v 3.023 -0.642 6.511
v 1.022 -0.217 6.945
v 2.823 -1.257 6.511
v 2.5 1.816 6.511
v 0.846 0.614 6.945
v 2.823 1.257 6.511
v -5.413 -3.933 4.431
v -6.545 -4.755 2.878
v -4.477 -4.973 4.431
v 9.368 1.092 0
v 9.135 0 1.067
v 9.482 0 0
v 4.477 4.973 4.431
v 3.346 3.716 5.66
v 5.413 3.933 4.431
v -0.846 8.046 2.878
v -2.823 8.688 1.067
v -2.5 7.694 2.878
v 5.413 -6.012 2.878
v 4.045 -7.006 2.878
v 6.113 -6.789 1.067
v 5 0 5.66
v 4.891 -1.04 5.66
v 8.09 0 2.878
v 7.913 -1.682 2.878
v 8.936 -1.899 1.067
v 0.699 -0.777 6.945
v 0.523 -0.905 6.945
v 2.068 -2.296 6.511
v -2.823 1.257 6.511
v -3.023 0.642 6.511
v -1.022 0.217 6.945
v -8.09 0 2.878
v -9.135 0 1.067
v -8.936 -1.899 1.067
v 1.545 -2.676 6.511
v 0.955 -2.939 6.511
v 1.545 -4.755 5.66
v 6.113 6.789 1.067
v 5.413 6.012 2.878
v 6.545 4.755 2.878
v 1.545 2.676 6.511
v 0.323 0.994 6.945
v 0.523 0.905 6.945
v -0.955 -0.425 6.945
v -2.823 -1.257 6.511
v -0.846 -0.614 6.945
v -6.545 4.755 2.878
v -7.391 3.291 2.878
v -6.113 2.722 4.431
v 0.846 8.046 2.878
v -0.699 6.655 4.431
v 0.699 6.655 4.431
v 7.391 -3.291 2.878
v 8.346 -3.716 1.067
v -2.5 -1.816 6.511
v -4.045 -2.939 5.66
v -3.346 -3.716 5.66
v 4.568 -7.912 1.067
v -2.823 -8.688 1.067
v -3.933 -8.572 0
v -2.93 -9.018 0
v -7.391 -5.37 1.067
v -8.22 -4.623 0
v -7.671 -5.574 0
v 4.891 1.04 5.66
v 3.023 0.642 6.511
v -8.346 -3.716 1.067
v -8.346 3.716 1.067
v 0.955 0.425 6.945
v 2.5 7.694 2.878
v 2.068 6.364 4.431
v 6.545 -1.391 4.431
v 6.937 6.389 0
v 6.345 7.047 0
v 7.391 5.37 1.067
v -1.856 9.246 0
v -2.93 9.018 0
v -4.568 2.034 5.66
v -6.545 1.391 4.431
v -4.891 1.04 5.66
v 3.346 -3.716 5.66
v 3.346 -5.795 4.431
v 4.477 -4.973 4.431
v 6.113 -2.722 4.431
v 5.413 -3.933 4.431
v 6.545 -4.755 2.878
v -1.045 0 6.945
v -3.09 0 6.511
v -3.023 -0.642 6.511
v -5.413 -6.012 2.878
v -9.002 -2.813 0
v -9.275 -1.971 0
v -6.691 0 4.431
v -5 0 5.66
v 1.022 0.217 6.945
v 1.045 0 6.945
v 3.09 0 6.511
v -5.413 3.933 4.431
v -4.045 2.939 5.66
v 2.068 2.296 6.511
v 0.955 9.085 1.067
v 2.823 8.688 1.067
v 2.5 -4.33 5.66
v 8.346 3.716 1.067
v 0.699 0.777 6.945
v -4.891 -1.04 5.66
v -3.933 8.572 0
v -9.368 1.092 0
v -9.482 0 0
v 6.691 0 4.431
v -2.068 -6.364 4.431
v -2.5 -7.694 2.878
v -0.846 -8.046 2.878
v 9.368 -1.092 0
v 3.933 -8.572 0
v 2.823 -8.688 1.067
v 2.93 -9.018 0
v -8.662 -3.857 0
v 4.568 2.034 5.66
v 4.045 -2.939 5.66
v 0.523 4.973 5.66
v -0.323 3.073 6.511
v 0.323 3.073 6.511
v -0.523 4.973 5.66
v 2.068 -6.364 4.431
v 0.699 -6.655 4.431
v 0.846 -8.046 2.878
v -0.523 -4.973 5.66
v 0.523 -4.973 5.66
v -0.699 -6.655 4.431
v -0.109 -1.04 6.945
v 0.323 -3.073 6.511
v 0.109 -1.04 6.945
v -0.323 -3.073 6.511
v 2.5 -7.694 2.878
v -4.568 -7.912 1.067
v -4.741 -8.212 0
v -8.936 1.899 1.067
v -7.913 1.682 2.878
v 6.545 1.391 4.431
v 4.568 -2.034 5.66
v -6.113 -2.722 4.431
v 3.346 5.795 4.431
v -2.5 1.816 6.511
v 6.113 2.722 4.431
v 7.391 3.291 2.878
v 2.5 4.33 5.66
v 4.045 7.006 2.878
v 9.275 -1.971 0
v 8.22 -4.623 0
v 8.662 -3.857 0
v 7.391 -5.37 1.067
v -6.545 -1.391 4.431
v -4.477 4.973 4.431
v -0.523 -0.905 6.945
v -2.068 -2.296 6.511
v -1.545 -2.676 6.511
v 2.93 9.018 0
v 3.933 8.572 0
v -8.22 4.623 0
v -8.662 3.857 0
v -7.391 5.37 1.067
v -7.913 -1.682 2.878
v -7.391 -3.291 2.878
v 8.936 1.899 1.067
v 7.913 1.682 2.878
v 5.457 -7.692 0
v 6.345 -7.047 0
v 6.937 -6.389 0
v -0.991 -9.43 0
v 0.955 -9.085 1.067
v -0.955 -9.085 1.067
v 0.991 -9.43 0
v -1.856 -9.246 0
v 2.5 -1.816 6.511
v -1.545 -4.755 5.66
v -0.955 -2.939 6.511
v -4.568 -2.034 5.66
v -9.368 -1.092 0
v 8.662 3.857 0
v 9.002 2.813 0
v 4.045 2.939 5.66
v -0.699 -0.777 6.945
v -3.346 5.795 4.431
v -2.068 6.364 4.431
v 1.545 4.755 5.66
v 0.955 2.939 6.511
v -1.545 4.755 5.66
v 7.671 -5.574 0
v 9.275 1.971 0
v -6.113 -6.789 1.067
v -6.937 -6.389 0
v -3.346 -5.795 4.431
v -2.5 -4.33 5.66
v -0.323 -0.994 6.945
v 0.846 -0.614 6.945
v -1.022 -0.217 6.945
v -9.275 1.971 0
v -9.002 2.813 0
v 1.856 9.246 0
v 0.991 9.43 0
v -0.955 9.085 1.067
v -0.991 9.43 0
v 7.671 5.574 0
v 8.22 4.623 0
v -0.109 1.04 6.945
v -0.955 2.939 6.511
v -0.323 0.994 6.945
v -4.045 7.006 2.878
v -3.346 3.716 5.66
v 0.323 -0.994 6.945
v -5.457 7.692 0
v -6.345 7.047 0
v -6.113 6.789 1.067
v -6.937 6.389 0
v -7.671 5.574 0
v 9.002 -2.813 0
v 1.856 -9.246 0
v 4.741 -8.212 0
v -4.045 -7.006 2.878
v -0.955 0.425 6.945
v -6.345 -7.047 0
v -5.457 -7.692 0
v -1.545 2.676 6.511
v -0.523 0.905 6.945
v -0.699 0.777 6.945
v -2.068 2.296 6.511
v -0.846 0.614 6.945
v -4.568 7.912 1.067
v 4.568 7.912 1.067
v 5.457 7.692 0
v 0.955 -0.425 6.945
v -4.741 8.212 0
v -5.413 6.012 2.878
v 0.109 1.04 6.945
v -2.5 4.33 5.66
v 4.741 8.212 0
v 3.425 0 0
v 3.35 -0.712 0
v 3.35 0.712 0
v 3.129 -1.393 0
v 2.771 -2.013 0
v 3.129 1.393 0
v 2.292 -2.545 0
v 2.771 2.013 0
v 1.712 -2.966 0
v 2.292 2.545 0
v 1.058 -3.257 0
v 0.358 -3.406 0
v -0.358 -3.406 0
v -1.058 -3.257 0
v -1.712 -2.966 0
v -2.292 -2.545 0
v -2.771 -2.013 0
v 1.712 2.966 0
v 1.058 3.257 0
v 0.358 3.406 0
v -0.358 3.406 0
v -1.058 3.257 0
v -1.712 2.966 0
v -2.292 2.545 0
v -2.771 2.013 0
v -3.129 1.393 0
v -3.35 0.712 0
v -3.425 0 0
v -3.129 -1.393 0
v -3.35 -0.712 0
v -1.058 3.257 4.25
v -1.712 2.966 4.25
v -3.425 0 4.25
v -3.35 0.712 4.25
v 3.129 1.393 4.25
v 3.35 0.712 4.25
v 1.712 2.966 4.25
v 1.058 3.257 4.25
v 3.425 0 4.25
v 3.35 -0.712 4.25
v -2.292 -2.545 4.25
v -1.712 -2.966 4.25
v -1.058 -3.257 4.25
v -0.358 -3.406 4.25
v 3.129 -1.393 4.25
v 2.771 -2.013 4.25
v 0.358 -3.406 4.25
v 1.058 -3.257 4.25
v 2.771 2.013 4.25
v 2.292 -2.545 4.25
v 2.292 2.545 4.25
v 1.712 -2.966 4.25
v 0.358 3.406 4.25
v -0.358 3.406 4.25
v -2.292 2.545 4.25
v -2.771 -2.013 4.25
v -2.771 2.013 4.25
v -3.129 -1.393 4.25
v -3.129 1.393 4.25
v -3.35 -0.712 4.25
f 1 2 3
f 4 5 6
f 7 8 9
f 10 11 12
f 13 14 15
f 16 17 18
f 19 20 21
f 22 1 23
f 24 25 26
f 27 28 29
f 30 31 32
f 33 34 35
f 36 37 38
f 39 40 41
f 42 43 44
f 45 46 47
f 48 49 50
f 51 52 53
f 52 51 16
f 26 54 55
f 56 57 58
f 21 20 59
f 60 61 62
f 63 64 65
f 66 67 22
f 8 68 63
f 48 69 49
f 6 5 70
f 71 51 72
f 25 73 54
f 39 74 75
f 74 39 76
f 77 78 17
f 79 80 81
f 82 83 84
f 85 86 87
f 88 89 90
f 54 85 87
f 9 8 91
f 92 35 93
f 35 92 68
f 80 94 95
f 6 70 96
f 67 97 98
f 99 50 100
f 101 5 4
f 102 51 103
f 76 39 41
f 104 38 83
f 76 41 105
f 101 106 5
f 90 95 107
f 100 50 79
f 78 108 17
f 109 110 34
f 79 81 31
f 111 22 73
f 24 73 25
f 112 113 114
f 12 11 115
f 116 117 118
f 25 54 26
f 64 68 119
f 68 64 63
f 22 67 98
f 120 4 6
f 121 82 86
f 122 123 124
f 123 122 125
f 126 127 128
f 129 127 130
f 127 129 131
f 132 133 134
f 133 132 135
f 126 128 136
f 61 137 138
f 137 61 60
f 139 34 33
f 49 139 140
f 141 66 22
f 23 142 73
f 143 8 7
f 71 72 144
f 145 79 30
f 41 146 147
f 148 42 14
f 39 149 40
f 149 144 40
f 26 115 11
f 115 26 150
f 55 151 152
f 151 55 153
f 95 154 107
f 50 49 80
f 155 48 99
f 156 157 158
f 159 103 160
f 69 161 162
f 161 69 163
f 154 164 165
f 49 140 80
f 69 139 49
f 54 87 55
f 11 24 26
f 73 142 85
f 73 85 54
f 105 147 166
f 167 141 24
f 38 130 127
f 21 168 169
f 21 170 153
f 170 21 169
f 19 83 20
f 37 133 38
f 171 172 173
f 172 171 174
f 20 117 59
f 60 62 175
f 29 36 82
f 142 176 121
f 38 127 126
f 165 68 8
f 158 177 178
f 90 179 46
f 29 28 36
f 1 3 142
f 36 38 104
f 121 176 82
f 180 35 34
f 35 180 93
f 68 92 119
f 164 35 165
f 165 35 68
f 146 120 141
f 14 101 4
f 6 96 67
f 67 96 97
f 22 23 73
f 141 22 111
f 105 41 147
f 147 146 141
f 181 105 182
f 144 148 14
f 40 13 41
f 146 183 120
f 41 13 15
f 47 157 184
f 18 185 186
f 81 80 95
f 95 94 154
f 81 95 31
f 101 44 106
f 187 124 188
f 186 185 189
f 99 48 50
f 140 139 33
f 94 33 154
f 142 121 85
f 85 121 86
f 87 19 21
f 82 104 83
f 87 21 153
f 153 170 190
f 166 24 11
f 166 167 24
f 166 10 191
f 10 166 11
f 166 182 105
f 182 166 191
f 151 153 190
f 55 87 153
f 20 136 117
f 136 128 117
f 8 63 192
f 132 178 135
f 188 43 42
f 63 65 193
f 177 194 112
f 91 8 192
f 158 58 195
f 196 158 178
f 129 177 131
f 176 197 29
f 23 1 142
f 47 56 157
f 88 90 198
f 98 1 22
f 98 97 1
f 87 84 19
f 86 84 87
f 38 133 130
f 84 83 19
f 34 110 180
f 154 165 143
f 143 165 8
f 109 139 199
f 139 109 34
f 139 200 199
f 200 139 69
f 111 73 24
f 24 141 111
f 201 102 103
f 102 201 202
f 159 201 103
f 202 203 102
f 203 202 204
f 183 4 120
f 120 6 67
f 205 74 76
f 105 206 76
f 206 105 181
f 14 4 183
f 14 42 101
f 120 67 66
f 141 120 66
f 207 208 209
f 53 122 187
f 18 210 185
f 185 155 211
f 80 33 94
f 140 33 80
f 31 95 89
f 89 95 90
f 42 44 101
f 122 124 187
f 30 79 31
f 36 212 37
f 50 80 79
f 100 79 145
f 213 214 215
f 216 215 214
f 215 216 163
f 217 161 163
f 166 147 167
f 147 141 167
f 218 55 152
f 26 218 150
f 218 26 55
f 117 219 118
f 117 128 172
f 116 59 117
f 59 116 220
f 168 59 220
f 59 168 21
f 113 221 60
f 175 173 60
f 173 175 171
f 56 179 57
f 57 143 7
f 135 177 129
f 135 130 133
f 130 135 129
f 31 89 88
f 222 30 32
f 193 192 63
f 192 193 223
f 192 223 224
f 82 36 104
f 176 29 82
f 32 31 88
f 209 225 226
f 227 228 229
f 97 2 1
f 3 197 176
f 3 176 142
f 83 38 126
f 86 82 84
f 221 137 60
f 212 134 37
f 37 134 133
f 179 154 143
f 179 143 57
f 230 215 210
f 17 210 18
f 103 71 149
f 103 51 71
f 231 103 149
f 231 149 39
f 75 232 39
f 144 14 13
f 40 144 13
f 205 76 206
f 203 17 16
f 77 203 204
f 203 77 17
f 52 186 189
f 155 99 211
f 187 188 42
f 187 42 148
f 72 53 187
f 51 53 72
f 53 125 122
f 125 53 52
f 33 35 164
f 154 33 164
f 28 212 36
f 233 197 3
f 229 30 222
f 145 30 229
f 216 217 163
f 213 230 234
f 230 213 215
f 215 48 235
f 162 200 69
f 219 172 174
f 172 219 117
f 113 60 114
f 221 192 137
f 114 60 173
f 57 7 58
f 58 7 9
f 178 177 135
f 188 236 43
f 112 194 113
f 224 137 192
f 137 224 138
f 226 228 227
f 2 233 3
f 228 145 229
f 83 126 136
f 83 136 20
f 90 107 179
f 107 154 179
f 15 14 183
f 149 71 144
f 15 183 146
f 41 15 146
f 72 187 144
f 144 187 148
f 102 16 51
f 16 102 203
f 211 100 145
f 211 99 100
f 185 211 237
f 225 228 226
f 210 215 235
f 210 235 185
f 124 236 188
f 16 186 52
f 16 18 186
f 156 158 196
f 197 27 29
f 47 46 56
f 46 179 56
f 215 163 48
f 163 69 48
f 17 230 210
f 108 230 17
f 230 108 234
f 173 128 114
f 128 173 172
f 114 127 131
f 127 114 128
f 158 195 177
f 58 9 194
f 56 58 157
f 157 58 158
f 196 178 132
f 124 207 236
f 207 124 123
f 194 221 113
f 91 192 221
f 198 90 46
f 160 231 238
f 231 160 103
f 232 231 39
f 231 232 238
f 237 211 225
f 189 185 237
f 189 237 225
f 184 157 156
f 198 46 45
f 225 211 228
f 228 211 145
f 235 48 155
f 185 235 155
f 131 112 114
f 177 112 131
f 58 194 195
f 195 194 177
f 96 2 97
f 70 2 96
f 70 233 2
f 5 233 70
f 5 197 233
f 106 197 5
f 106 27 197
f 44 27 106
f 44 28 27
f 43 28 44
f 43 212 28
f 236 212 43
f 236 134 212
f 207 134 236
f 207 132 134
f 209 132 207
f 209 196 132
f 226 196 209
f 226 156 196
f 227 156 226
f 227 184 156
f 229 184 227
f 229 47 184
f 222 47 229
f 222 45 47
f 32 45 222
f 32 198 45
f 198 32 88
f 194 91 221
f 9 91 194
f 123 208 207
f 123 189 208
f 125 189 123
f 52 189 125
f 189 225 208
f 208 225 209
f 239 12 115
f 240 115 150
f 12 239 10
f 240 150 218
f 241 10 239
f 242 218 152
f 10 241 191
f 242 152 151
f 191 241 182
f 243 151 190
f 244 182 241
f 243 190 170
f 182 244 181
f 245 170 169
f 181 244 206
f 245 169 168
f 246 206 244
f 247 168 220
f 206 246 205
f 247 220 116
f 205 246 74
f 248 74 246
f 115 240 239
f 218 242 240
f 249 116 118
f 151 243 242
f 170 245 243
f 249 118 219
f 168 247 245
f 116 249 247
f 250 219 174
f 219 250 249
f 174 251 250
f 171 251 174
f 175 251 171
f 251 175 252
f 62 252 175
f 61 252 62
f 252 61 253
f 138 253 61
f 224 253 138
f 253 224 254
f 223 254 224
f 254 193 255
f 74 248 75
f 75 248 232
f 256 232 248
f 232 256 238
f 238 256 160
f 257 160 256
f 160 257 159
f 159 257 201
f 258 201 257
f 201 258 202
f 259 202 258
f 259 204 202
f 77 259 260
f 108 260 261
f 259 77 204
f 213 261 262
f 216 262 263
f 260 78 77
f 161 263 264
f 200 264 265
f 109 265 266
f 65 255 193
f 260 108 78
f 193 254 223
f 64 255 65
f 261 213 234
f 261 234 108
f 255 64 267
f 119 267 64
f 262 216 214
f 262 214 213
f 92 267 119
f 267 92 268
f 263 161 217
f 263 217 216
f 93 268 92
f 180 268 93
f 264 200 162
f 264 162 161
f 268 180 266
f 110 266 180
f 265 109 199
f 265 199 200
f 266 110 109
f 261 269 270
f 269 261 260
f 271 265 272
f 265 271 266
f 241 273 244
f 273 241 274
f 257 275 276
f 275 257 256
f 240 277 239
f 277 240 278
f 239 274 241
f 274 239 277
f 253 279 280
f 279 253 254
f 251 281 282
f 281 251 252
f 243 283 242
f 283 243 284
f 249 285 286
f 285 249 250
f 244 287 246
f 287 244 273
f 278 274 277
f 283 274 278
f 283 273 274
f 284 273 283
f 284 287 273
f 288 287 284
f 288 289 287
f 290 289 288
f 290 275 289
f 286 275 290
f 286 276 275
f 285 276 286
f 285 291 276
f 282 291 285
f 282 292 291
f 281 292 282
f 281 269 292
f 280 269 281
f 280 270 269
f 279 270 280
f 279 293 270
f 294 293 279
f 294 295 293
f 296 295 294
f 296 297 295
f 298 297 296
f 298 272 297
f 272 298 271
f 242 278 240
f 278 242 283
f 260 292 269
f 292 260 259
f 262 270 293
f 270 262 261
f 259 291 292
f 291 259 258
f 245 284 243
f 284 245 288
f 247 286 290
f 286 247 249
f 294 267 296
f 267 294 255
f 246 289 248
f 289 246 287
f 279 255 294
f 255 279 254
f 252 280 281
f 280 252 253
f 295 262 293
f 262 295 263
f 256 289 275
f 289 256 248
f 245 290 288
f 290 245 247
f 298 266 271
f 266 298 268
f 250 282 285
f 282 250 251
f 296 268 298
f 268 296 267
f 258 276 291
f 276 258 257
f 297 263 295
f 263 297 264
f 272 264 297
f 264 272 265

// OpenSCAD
$fs=0.1;

// This needs a M4x12 screw with a hex socket top
module skadis_standoff() {
	difference() {
		cylinder(d1=14.5, d2=16.75, h=20);
		translate([0,0,10])
			cylinder(d=3.9, h=15);
	}
	//translate([0,0,20])
	//	cylinder(d=4.9, h=5);


	translate([0,-5,20])
		cylinder(d=2, h=2.5);
	translate([0,5,20])
		cylinder(d=2, h=2.5);
}

module skadis_topper() {
	difference() {
		translate([0,0,-3]) sphere(d=20);
		translate([0,0,-10]) cube([20,20,20],center=true);
		#translate([0,0,0]) cylinder(d=6.85,h=4.25);
	}
}

//skadis_standoff();
skadis_topper();

// vim: set sw=2 ts=2 :
